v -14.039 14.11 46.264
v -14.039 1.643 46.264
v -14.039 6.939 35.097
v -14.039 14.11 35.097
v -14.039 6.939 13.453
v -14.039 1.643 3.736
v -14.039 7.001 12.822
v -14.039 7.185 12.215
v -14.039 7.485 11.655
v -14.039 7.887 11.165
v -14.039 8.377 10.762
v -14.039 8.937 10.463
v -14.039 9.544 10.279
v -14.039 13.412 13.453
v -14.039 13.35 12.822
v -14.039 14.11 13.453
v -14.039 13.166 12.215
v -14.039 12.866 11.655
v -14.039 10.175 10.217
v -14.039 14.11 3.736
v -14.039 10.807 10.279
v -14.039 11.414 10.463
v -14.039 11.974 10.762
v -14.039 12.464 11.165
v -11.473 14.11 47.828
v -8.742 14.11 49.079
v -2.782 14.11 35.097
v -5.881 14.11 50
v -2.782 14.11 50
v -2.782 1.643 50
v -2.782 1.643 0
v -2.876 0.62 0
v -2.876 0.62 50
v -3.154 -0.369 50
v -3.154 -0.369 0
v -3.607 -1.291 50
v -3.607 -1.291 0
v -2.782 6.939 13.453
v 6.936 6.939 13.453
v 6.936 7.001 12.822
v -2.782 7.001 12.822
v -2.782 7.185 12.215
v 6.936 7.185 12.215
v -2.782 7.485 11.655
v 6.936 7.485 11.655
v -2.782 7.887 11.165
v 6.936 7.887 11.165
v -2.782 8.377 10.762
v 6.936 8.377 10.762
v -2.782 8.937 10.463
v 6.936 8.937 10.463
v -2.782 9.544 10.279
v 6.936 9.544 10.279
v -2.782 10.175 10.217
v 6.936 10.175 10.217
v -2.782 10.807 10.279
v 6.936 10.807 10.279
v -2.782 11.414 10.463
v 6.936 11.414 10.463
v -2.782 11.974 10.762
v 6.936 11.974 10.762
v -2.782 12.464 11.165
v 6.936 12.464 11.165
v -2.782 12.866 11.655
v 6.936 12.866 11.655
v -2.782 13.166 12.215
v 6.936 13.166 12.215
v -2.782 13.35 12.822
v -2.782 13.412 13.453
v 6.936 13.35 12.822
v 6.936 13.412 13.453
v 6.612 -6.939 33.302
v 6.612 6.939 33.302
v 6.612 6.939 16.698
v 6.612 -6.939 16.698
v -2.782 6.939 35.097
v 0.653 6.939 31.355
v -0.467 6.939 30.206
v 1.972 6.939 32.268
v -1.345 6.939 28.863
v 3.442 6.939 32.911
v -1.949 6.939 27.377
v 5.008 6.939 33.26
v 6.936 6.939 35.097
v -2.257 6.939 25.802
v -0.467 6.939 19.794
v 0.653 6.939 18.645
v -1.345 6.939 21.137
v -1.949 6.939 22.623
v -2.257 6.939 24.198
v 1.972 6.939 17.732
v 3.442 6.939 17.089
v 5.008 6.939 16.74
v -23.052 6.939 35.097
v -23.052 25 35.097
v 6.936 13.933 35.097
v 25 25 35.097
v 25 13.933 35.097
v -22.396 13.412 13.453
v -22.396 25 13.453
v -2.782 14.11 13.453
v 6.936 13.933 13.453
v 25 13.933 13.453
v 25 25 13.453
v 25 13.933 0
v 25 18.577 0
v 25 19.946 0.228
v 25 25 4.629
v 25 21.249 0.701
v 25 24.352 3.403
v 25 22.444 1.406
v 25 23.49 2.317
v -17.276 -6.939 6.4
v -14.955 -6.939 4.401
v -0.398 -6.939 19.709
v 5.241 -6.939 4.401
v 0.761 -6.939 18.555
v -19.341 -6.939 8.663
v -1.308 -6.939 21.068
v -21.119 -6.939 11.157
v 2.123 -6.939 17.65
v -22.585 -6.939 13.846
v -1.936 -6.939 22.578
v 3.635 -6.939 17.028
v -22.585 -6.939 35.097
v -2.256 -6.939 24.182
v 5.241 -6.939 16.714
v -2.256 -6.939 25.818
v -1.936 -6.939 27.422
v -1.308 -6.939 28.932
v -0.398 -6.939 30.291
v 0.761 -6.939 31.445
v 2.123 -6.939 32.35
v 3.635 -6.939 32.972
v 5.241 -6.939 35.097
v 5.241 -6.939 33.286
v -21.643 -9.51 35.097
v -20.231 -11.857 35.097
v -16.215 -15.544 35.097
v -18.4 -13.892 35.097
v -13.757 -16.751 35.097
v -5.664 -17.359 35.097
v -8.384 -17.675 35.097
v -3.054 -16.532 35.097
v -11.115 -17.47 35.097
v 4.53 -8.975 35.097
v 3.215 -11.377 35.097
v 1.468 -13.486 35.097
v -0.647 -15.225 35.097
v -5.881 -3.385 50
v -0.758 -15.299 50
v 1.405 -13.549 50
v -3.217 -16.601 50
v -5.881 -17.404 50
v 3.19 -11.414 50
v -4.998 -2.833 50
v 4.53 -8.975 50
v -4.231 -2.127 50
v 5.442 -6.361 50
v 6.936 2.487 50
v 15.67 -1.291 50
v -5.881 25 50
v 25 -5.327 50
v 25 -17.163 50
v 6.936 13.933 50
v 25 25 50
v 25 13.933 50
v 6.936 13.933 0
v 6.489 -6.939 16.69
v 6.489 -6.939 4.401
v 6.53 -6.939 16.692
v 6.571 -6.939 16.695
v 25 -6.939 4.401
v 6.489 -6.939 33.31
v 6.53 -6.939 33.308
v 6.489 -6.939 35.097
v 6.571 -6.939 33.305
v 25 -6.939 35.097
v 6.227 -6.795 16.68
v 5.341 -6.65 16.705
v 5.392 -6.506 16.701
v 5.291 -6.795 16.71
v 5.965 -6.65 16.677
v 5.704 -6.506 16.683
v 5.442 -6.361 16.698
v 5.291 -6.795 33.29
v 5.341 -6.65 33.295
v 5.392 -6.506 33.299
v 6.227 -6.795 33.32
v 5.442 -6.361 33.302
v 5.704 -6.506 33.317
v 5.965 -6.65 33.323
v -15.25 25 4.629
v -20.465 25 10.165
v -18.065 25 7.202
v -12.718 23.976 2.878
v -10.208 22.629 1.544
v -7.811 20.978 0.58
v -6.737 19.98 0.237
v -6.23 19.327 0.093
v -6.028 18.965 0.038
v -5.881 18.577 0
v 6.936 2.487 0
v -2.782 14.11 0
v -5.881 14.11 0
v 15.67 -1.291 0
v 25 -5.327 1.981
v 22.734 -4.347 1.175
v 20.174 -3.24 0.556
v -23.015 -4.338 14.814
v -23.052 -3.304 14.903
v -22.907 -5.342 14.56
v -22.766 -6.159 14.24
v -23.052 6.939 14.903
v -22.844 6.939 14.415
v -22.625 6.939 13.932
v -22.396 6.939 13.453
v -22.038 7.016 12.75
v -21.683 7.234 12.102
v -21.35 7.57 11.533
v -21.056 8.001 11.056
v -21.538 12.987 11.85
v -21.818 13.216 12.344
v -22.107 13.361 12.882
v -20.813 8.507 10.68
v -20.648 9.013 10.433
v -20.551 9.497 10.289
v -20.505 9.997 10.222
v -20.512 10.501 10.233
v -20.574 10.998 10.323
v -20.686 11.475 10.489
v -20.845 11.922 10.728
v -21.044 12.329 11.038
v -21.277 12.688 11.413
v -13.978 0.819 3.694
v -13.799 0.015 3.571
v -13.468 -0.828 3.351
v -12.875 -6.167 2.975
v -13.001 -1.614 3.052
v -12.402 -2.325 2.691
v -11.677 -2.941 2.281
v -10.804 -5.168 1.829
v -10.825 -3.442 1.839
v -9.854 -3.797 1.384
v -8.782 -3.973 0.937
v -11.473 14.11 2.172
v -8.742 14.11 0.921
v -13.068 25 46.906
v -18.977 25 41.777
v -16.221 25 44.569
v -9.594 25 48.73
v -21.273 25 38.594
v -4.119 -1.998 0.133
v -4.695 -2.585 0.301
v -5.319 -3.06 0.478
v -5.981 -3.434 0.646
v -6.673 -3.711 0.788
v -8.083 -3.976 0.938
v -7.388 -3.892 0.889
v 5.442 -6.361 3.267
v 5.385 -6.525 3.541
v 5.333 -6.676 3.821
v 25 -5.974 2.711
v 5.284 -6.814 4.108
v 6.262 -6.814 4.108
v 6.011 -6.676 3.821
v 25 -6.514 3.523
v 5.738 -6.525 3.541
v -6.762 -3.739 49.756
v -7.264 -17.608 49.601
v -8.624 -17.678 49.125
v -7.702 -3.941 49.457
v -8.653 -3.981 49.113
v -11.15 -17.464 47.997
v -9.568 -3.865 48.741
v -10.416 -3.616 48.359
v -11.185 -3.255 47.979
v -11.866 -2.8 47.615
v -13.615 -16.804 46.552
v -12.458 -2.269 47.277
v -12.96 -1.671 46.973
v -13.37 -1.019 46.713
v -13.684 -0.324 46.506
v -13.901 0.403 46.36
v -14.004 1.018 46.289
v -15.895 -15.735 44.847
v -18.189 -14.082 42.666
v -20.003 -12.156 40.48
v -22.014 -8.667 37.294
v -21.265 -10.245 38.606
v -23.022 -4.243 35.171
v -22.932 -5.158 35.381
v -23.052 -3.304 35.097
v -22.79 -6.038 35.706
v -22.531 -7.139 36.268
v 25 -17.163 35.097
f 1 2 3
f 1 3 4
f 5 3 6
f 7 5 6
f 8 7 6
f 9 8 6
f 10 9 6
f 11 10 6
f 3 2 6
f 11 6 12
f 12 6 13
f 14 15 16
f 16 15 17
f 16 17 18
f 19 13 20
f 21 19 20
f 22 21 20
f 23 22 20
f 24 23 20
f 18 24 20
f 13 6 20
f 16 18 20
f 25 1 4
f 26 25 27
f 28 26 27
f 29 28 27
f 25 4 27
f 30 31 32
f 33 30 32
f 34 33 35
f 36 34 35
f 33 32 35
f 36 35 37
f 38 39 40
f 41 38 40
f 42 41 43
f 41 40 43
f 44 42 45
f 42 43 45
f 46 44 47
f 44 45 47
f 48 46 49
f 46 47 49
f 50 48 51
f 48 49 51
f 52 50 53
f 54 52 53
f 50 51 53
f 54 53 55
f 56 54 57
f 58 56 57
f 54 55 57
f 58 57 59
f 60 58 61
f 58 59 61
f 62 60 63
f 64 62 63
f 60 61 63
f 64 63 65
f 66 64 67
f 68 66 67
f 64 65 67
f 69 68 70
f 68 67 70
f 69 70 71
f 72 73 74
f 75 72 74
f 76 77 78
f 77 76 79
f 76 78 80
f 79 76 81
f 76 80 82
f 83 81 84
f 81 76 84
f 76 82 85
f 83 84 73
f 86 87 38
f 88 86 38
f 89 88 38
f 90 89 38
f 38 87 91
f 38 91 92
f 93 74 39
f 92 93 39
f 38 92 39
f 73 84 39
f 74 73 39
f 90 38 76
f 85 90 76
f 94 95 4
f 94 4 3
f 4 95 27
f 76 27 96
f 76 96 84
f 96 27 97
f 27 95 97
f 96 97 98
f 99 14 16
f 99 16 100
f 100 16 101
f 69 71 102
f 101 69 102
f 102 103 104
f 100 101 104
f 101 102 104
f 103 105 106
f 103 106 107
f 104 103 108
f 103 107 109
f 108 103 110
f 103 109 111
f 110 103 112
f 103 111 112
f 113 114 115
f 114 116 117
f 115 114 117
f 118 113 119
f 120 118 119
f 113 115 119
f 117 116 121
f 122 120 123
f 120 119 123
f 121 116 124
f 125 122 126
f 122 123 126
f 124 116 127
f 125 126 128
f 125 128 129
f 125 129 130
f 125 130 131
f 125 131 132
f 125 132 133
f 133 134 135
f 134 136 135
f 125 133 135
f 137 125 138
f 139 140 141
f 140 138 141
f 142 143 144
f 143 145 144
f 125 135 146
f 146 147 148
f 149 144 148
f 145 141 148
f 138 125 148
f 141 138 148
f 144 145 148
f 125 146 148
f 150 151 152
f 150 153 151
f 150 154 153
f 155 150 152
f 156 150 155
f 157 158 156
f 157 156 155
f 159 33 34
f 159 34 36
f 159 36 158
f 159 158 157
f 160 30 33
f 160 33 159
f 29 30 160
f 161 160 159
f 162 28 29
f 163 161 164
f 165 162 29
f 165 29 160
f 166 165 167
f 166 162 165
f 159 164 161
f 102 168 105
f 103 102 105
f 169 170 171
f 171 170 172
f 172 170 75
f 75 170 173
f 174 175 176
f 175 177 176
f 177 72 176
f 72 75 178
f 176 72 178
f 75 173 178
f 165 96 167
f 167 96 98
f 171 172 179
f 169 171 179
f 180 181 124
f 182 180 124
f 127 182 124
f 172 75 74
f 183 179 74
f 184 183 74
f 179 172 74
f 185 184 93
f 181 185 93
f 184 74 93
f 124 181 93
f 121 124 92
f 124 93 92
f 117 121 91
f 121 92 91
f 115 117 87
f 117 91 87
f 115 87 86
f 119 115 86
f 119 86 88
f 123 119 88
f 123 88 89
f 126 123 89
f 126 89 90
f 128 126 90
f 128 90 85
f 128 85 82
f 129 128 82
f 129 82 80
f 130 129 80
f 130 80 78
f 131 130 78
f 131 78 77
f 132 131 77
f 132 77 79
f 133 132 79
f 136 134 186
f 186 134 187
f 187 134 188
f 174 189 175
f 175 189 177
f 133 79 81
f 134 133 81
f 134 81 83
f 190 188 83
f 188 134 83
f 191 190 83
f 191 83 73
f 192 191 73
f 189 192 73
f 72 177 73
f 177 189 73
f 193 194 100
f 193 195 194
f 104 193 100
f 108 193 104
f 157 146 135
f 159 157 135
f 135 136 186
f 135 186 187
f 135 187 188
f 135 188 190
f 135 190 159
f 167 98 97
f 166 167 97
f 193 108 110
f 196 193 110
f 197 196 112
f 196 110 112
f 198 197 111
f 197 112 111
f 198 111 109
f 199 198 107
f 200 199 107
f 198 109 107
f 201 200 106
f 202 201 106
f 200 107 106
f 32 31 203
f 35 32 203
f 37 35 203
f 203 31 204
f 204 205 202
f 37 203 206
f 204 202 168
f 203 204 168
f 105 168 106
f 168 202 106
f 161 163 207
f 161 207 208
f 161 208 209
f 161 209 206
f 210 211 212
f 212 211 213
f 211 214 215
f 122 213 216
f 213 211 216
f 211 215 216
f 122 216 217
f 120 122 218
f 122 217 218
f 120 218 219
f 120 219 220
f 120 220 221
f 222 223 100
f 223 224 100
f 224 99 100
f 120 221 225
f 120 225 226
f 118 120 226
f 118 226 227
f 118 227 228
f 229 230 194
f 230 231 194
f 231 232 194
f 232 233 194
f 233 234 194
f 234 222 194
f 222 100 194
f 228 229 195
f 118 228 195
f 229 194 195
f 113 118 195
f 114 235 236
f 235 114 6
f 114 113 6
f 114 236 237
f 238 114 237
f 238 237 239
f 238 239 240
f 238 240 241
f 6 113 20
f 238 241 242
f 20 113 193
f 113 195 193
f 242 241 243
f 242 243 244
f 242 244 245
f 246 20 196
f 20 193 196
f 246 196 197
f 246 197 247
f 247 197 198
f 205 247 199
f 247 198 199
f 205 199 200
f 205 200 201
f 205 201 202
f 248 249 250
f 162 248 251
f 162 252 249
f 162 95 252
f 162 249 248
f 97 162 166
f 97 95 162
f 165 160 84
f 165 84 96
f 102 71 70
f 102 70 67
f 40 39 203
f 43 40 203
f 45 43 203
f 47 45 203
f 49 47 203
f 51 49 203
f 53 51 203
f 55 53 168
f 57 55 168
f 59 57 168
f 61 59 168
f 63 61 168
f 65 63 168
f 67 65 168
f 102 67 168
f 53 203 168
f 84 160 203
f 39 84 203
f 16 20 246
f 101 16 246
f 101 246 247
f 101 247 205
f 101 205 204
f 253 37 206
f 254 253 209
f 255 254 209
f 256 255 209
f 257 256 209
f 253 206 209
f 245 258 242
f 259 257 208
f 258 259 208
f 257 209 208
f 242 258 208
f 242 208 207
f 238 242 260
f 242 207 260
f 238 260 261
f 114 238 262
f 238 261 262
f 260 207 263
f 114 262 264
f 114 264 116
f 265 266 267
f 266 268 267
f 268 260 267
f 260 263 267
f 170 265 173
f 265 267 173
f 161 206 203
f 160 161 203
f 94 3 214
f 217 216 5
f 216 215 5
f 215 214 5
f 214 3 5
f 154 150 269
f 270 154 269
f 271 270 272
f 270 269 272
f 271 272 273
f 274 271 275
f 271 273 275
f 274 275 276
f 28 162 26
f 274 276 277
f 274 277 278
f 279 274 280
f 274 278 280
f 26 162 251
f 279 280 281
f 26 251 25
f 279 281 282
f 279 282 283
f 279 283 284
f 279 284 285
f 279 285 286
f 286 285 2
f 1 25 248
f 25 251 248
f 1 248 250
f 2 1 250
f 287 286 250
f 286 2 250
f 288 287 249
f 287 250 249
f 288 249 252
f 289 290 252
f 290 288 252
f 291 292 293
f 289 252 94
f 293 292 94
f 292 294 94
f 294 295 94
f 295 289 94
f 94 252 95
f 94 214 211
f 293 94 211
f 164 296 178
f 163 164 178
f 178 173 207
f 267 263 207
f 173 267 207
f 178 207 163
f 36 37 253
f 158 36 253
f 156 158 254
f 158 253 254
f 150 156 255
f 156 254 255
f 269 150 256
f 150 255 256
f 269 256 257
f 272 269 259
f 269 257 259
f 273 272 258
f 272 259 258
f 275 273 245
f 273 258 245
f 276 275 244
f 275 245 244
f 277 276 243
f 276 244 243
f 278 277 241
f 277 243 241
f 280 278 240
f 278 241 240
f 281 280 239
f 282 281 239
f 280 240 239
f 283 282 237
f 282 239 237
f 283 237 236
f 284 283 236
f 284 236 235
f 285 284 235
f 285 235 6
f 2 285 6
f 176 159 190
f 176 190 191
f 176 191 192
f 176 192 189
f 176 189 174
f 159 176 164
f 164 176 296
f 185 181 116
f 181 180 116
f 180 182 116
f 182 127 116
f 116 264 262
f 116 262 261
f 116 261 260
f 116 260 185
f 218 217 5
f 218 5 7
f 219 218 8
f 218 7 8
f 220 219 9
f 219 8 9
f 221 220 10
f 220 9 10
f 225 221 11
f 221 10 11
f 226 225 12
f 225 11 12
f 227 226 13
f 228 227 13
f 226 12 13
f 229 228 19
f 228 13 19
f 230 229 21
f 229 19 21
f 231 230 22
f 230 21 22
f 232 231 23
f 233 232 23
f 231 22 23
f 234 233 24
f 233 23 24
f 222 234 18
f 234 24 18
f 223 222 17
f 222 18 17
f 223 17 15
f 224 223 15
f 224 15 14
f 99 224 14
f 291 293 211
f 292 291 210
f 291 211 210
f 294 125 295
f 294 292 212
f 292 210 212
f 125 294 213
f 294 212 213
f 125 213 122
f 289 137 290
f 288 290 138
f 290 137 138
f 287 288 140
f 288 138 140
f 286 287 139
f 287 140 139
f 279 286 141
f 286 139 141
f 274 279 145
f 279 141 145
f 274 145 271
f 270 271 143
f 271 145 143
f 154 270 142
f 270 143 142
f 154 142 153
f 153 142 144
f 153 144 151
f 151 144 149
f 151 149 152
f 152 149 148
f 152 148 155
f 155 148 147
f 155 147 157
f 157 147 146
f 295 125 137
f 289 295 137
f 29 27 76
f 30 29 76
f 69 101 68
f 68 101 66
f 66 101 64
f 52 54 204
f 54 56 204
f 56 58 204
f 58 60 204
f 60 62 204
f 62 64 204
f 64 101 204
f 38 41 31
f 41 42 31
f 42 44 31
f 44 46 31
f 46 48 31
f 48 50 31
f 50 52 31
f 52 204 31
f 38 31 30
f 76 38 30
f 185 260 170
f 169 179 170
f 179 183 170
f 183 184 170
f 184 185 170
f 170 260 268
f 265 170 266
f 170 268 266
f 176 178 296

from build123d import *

# Parameters (mm, degrees)
F0_W     = 50
F0_H     = 50
F1_DEPTH = 50
F3_DEPTH = 50.001
F5_DEPTH = 50.001
F7_DEPTH = 50.001


# Not quite as in the source:
# - a feature names something its author has since deleted; it is built from what else it names


with BuildPart() as f1:
    # F0 (on Top) → F1 (new body)
    with BuildSketch(Plane.XY):
        Rectangle(F0_W, F0_H)
    extrude(amount=F1_DEPTH)

    # F2 (on face) → F3 (cut, through all)
    with BuildSketch(Plane(origin=(0, 25, 0), x_dir=(-1, 0, 0), z_dir=(0, 1, 0))):
        with BuildLine():
            ThreePointArc((-6.6122752614, 16.6977748275), (2.2958755953, 25), (-6.6122752614, 33.3022251725))
            Line((-6.6122752614, 33.3022251725), (-6.6122752614, 16.6977748275))
        make_face()
        with BuildLine():
            ThreePointArc((5.8814799413, 50), (19.5641723767, 41.0564068722), (25, 25.640320846))
            Line((25, 25.640320846), (25, 50))
            Line((25, 50), (5.8814799413, 50))
        make_face()
        with BuildLine():
            Line((25, 0), (25, 24.359679154))
            ThreePointArc((25, 24.359679154), (19.5641723767, 8.9435931278), (5.8814799413, 0))
            Line((5.8814799413, 0), (25, 0))
        make_face()
    extrude(amount=-F3_DEPTH, mode=Mode.SUBTRACT)

    # F4 (on face) → F5 (cut, through all)
    with BuildSketch(Plane.YZ.offset(25)):
        Polygon((-6.9390782155, 35.097297281), (-25, 35.097297281), (-25, 0), (-6.9390782155, 0), (-6.9390782155, 4.401256796), (-6.9390782155, 13.4532200173), align=None)
        with BuildLine():
            Line((25, 13.4532200173), (25, 35.097297281))
            Line((25, 35.097297281), (6.9390782155, 35.097297281))
            Line((6.9390782155, 35.097297281), (6.9390782155, 13.4532200173))
            ThreePointArc((6.9390782155, 13.4532200173), (10.1754756179, 10.2168226149), (13.4118730202, 13.4532200173))
            Line((13.4118730202, 13.4532200173), (25, 13.4532200173))
        make_face()
        with BuildLine():
            Line((25, 0), (25, 4.6294564381))
            ThreePointArc((25, 4.6294564381), (22.4439231862, 1.4056456338), (18.5773167759, 0))
            Line((18.5773167759, 0), (25, 0))
        make_face()
        with BuildLine():
            Line((-6.9390782155, 4.401256796), (-6.9390782155, 0))
            Line((-6.9390782155, 0), (-1.2912911565, 0))
            ThreePointArc((-1.2912911565, 0), (-4.7087911569, 1.438899851), (-6.9390782155, 4.401256796))
        make_face()
    extrude(amount=-F5_DEPTH, mode=Mode.SUBTRACT)

    # F6 (on face) → F7 (cut, through all)
    with BuildSketch(Plane(origin=(0, 0, 0), x_dir=(1, 0, 0), z_dir=(0, 0, -1))):
        Polygon((-27.4569652975, -12.0541369542), (-23.0521892468, -12.0541369542), (-23.0521892468, 3.30411084), (-23.0521892468, 9.0968515724), (-27.4569652975, 9.0968515724), align=None)
        Polygon((6.9360537454, -13.9329824597), (25, -13.9329824597), (25, 1.2912911565), (15.6700833973, 1.2912911565), (6.9360537454, -2.4867046159), align=None)
        with BuildLine():
            Line((-23.0521892468, 9.0968515724), (-23.0521892468, 3.30411084))
            ThreePointArc((-23.0521892468, 3.30411084), (-11.5730780457, 17.3836701729), (4.5299022458, 8.9754592627))
            Line((4.5299022458, 8.9754592627), (5.442249123, 6.361215841))
            Line((5.442249123, 6.361215841), (25, 17.1625725925))
            Line((25, 17.1625725925), (25, 25))
            Line((25, 25), (-23.0521892468, 25))
            Line((-23.0521892468, 25), (-23.0521892468, 9.0968515724))
        make_face()
        Polygon((15.6700833973, 1.2912911565), (25, 1.2912911565), (25, 5.3270440549), align=None)
        with BuildLine():
            Line((-5.8814799413, 1.2912911565), (-5.8814799413, -14.1096981242))
            Line((-5.8814799413, -14.1096981242), (-2.7823168784, -14.1096981242))
            Line((-2.7823168784, -14.1096981242), (-2.7823168784, -1.6426106449))
            ThreePointArc((-2.7823168784, -1.6426106449), (-2.9925352611, -0.1187433848), (-3.6074871188, 1.2912911565))
            Line((-3.6074871188, 1.2912911565), (-5.8814799413, 1.2912911565))
        make_face()
        with BuildLine():
            Line((-14.0390070155, -14.1096981242), (-5.8814799413, -14.1096981242))
            Line((-5.8814799413, -14.1096981242), (-5.8814799413, 1.2912911565))
            Line((-5.8814799413, 1.2912911565), (-3.6074871188, 1.2912911565))
            ThreePointArc((-3.6074871188, 1.2912911565), (-9.9345292071, 3.7755160409), (-14.0390070155, -1.6426106449))
            Line((-14.0390070155, -1.6426106449), (-14.0390070155, -14.1096981242))
        make_face()
    extrude(amount=-F7_DEPTH, mode=Mode.SUBTRACT)


solid = f1.part
